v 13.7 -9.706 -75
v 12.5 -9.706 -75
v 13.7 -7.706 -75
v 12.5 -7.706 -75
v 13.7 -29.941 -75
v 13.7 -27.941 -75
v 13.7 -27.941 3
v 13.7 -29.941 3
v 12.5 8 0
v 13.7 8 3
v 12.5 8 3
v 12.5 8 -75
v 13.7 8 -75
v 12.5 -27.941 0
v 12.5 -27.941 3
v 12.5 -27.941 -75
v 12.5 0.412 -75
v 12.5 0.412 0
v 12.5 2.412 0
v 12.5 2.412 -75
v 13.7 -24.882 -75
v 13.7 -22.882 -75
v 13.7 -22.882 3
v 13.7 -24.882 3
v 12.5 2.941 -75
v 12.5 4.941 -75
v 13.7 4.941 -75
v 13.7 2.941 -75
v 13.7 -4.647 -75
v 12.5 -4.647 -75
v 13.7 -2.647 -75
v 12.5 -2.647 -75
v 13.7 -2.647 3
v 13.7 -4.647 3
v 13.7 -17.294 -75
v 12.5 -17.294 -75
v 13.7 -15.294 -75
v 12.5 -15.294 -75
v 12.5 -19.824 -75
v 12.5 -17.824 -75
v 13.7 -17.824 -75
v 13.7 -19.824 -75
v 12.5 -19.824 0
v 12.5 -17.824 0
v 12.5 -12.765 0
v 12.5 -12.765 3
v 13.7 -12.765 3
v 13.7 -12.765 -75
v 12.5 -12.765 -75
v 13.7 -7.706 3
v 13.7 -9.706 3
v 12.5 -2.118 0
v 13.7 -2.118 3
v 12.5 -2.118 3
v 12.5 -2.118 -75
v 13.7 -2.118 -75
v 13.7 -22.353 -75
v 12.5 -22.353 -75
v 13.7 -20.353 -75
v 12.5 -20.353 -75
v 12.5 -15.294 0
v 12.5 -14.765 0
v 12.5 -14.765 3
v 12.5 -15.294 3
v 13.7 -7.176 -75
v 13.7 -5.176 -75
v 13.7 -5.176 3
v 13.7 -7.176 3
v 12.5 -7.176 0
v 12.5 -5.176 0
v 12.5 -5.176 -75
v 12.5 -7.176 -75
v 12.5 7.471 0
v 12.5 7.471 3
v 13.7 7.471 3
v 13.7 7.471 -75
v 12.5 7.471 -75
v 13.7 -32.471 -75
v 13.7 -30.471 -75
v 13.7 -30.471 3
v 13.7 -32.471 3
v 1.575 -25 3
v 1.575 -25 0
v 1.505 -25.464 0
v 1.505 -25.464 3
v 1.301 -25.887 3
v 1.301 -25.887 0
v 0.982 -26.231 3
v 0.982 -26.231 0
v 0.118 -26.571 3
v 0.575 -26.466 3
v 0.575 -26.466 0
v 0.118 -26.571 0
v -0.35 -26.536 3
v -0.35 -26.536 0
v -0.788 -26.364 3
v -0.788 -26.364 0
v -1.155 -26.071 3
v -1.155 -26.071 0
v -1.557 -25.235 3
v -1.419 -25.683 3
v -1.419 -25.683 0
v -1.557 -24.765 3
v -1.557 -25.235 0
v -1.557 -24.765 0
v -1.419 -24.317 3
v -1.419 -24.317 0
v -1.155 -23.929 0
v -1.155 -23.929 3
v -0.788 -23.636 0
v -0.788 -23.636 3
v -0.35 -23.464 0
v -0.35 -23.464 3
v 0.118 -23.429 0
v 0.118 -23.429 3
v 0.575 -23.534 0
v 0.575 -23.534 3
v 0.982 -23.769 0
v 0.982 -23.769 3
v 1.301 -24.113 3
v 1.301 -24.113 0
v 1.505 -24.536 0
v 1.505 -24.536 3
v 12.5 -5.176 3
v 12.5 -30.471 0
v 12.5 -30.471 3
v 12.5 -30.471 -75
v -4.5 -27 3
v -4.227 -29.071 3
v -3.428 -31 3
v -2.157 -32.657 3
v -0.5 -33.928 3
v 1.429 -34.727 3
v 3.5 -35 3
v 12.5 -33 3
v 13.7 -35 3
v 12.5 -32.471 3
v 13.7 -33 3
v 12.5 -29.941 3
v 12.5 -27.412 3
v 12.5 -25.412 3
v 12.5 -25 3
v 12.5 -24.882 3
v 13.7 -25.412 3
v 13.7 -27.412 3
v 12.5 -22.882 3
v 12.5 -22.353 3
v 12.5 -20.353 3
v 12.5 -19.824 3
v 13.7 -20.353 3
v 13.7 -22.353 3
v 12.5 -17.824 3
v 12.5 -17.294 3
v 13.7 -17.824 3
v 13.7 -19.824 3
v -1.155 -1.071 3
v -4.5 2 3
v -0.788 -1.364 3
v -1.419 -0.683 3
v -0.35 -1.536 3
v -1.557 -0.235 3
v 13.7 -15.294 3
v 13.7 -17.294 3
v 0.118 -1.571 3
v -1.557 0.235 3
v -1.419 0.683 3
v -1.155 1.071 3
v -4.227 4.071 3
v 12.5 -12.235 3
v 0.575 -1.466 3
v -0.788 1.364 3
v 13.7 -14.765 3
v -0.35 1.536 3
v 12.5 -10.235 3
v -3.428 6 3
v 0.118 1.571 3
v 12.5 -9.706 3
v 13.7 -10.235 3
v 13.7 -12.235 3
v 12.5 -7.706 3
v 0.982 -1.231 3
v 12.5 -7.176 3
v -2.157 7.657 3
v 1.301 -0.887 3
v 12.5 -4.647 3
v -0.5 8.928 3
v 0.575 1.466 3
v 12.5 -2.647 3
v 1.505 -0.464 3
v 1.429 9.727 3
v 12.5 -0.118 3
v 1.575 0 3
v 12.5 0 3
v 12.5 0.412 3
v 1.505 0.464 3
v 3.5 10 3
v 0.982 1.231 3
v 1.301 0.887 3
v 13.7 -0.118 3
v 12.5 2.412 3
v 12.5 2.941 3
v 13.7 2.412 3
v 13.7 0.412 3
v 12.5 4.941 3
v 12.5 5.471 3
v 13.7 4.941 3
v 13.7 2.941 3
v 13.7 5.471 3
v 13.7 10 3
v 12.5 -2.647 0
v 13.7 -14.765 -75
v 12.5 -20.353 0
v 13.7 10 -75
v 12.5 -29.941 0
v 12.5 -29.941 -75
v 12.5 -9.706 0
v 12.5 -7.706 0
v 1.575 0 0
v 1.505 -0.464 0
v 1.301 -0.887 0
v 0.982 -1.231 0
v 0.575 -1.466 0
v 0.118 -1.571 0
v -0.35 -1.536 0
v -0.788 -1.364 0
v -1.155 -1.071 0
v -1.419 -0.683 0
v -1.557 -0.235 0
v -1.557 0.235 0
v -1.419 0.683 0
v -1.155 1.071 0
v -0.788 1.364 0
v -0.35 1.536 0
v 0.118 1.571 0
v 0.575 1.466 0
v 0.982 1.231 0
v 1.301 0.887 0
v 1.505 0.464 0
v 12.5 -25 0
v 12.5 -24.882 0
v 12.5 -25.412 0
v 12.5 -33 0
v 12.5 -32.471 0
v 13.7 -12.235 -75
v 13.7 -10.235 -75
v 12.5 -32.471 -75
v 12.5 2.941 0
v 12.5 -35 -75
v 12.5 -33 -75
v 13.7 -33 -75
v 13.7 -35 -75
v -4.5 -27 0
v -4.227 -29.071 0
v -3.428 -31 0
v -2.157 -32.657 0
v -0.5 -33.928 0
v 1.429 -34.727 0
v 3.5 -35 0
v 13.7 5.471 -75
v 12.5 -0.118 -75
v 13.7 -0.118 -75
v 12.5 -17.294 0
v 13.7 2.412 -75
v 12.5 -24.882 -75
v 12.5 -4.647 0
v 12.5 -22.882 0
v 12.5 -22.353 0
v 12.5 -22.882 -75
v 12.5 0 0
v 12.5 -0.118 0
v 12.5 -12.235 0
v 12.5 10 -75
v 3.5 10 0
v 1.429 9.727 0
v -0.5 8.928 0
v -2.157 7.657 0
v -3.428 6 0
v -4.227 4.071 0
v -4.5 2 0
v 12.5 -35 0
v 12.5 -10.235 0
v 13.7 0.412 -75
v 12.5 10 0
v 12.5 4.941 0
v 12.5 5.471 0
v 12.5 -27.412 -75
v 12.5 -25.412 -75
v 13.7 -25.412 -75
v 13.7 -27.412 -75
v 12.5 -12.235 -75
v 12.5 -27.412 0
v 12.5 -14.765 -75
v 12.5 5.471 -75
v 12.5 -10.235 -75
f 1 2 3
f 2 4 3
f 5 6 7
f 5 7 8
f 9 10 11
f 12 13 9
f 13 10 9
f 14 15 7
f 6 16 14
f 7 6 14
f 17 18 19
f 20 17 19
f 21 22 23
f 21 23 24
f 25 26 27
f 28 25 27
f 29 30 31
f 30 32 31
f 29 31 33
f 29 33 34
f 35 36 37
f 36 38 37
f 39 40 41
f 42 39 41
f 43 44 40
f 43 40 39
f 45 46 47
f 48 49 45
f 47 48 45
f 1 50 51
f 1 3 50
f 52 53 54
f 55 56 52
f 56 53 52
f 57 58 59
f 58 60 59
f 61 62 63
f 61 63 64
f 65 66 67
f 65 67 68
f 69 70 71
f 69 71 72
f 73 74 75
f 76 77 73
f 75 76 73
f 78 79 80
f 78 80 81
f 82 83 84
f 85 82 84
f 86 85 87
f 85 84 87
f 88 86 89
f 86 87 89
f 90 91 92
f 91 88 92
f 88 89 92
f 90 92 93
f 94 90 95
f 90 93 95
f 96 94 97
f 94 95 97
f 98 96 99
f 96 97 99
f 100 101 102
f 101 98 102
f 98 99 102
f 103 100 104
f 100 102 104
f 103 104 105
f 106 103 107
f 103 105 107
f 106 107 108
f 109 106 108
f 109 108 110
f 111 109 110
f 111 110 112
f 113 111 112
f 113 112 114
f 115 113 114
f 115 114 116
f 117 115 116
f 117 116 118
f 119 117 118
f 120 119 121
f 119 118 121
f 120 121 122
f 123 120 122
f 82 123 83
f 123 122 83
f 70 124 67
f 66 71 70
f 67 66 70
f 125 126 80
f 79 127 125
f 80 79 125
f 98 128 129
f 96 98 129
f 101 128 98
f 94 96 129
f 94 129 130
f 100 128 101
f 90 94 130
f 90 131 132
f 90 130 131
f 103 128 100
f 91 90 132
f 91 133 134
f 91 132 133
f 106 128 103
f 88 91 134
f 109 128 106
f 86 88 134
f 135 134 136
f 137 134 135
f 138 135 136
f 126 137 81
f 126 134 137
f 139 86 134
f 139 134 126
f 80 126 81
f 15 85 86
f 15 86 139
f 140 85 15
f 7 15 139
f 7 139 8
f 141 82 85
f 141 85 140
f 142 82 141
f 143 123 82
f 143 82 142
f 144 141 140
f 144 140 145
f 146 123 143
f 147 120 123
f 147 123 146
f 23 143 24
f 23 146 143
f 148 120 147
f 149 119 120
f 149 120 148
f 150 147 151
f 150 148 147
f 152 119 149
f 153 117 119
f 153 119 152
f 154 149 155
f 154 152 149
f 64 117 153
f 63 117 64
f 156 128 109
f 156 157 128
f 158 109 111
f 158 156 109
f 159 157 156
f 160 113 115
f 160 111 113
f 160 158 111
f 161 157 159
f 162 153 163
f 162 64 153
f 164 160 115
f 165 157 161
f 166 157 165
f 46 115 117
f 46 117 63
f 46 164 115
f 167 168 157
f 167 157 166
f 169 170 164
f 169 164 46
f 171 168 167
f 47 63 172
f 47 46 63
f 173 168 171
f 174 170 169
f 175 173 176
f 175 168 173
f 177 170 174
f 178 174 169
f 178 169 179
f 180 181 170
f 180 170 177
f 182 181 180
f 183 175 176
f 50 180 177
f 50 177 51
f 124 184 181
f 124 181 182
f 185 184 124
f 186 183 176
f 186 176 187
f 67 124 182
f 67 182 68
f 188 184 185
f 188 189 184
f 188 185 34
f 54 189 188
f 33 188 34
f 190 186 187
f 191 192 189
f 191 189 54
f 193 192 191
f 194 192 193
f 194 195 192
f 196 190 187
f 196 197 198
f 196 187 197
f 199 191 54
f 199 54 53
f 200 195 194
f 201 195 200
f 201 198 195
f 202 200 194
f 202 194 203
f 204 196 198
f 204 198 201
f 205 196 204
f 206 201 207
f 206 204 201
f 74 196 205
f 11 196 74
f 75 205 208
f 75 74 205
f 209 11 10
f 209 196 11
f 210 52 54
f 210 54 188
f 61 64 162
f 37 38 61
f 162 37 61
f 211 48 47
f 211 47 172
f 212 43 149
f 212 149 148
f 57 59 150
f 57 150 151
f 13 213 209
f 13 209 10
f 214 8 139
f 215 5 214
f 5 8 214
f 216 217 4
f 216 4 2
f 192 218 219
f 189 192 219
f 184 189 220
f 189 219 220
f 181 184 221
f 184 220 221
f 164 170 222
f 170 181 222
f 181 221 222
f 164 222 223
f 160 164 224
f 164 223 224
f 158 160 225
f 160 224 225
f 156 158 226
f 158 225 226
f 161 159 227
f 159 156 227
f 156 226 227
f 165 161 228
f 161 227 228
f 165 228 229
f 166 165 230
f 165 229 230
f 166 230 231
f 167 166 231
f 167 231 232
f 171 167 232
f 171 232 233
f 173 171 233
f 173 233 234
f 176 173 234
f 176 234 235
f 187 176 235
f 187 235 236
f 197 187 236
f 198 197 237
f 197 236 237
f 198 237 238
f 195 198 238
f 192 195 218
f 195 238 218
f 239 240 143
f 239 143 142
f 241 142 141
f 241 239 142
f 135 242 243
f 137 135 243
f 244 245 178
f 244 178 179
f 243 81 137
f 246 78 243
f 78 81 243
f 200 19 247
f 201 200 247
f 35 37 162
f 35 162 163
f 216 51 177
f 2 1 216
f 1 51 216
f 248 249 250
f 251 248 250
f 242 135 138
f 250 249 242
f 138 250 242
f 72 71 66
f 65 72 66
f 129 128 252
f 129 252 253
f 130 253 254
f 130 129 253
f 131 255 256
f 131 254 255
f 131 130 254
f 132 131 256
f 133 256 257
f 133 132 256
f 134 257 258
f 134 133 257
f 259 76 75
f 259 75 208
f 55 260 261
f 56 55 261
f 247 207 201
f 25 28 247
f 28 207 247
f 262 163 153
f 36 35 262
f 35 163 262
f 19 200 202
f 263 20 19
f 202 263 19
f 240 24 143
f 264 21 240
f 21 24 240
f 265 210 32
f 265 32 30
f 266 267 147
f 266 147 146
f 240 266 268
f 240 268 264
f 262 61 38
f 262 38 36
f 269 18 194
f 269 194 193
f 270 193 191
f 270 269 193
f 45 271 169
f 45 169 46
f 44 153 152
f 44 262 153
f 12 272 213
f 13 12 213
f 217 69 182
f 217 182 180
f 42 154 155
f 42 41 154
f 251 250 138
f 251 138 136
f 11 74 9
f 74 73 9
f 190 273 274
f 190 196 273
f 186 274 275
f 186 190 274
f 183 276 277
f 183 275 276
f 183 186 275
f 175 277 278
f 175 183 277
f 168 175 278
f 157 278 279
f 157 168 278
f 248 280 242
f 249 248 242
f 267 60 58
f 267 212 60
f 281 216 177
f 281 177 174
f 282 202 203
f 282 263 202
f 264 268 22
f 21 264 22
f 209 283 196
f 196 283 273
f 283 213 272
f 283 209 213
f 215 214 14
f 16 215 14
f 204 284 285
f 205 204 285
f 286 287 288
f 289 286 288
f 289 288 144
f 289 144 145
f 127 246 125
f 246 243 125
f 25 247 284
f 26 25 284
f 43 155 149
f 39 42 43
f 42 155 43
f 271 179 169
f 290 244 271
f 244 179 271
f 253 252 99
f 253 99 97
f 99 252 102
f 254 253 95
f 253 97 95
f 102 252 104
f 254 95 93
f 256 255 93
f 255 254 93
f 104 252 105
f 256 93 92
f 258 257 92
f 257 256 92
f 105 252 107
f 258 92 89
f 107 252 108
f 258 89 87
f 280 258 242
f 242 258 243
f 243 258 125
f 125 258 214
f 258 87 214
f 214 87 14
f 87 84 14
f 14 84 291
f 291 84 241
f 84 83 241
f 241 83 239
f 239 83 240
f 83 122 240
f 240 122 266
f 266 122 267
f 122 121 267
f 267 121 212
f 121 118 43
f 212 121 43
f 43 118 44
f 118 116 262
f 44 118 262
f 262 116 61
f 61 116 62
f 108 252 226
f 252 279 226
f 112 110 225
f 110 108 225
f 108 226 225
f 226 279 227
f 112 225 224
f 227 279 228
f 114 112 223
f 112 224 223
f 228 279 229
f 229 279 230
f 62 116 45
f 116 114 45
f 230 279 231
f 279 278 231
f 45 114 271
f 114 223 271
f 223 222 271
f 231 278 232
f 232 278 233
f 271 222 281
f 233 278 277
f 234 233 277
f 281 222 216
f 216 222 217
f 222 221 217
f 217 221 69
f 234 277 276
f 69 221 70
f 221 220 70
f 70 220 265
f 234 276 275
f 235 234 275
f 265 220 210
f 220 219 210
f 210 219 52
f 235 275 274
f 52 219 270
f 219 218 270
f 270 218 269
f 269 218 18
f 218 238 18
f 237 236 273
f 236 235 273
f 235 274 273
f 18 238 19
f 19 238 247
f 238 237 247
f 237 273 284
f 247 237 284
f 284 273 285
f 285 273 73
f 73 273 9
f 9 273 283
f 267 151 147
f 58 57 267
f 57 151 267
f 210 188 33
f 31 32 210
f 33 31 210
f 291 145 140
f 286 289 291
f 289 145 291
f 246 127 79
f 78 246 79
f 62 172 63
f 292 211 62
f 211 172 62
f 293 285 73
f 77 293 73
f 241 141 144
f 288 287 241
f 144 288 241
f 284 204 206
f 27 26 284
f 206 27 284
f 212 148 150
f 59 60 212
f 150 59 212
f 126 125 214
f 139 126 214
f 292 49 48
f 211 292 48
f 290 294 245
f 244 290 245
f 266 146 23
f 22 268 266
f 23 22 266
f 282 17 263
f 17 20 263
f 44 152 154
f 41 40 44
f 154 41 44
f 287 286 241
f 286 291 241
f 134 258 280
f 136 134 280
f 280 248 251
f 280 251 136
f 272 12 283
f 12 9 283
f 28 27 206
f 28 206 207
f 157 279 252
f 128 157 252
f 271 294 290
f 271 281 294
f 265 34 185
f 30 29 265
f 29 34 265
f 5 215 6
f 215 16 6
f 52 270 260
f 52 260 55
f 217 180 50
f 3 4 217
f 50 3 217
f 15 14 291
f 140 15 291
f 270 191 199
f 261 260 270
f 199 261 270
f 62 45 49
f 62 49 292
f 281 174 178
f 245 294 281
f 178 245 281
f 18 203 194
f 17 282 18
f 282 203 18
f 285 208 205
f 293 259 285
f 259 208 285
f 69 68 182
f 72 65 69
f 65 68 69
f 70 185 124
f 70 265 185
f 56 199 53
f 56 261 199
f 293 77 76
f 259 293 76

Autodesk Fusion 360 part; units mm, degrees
sketch "Boceto1" plane through (0, 0, 0) normal (0, 0, 1) x (1, 0, 0)
  circle A0 centre (0, 0) radius 1.575
  line L0 (0, 0) -> (12.5, 0)
  line L1 (12.5, 0) -> (12.5, 10)
  line L2 (12.5, 0) -> (12.5, -25)
  line L3 (12.5, 10) -> (-4.5, 10)
  line L4 (-4.5, 10) -> (-4.5, -35)
  line L5 (-4.5, -35) -> (12.5, -35)
  line L6 (12.5, -35) -> (12.5, 10)
  line L7 (12.5, -25) -> (0, -25)
  circle A1 centre (0, -25) radius 1.575
  line L8 (12.5, 10) -> (13.7, 10)
  line L9 (13.7, 10) -> (13.7, 8)
  line L10 (13.7, 8) -> (12.5, 8)
  line L11 (12.5, 8) -> (12.5, 10)
  line L12 (13.7, 5.4706) -> (12.5, 5.4706)
  line L13 (13.7, 7.4706) -> (13.7, 5.4706)
  line L14 (12.5, 7.4706) -> (13.7, 7.4706)
  line L15 (12.5, 5.4706) -> (12.5, 7.4706)
  line L16 (13.7, 2.9412) -> (12.5, 2.9412)
  line L17 (13.7, 4.9412) -> (13.7, 2.9412)
  line L18 (12.5, 4.9412) -> (13.7, 4.9412)
  line L19 (12.5, 2.9412) -> (12.5, 4.9412)
  line L20 (13.7, 0.4118) -> (12.5, 0.4118)
  line L21 (13.7, 2.4118) -> (13.7, 0.4118)
  line L22 (12.5, 2.4118) -> (13.7, 2.4118)
  line L23 (12.5, 0.4118) -> (12.5, 2.4118)
  line L24 (13.7, -2.1176) -> (12.5, -2.1176)
  line L25 (13.7, -0.1176) -> (13.7, -2.1176)
  line L26 (12.5, -0.1176) -> (13.7, -0.1176)
  line L27 (12.5, -2.1176) -> (12.5, -0.1176)
  line L28 (13.7, -4.6471) -> (12.5, -4.6471)
  line L29 (13.7, -2.6471) -> (13.7, -4.6471)
  line L30 (12.5, -2.6471) -> (13.7, -2.6471)
  line L31 (12.5, -4.6471) -> (12.5, -2.6471)
  line L32 (13.7, -7.1765) -> (12.5, -7.1765)
  line L33 (13.7, -5.1765) -> (13.7, -7.1765)
  line L34 (12.5, -5.1765) -> (13.7, -5.1765)
  line L35 (12.5, -7.1765) -> (12.5, -5.1765)
  line L36 (13.7, -9.7059) -> (12.5, -9.7059)
  line L37 (13.7, -7.7059) -> (13.7, -9.7059)
  line L38 (12.5, -7.7059) -> (13.7, -7.7059)
  line L39 (12.5, -9.7059) -> (12.5, -7.7059)
  line L40 (13.7, -12.2353) -> (12.5, -12.2353)
  line L41 (13.7, -10.2353) -> (13.7, -12.2353)
  line L42 (12.5, -10.2353) -> (13.7, -10.2353)
  line L43 (12.5, -12.2353) -> (12.5, -10.2353)
  line L44 (13.7, -14.7647) -> (12.5, -14.7647)
  line L45 (13.7, -12.7647) -> (13.7, -14.7647)
  line L46 (12.5, -12.7647) -> (13.7, -12.7647)
  line L47 (12.5, -14.7647) -> (12.5, -12.7647)
  line L48 (13.7, -17.2941) -> (12.5, -17.2941)
  line L49 (13.7, -15.2941) -> (13.7, -17.2941)
  line L50 (12.5, -15.2941) -> (13.7, -15.2941)
  line L51 (12.5, -17.2941) -> (12.5, -15.2941)
  line L52 (13.7, -19.8235) -> (12.5, -19.8235)
  line L53 (13.7, -17.8235) -> (13.7, -19.8235)
  line L54 (12.5, -17.8235) -> (13.7, -17.8235)
  line L55 (12.5, -19.8235) -> (12.5, -17.8235)
  line L56 (13.7, -22.3529) -> (12.5, -22.3529)
  line L57 (13.7, -20.3529) -> (13.7, -22.3529)
  line L58 (12.5, -20.3529) -> (13.7, -20.3529)
  line L59 (12.5, -22.3529) -> (12.5, -20.3529)
  line L60 (13.7, -24.8824) -> (12.5, -24.8824)
  line L61 (13.7, -22.8824) -> (13.7, -24.8824)
  line L62 (12.5, -22.8824) -> (13.7, -22.8824)
  line L63 (12.5, -24.8824) -> (12.5, -22.8824)
  line L64 (13.7, -27.4118) -> (12.5, -27.4118)
  line L65 (13.7, -25.4118) -> (13.7, -27.4118)
  line L66 (12.5, -25.4118) -> (13.7, -25.4118)
  line L67 (12.5, -27.4118) -> (12.5, -25.4118)
  line L68 (13.7, -29.9412) -> (12.5, -29.9412)
  line L69 (13.7, -27.9412) -> (13.7, -29.9412)
  line L70 (12.5, -27.9412) -> (13.7, -27.9412)
  line L71 (12.5, -29.9412) -> (12.5, -27.9412)
  line L72 (13.7, -32.4706) -> (12.5, -32.4706)
  line L73 (13.7, -30.4706) -> (13.7, -32.4706)
  line L74 (12.5, -30.4706) -> (13.7, -30.4706)
  line L75 (12.5, -32.4706) -> (12.5, -30.4706)
  line L76 (13.7, -35) -> (12.5, -35)
  line L77 (13.7, -33) -> (13.7, -35)
  line L78 (12.5, -33) -> (13.7, -33)
  line L79 (12.5, -35) -> (12.5, -33)
  dimension "d1" = 3.15
  dimension "d2" = 12.5
  dimension "d3" = 10
  dimension "d4" = 25
  dimension "d5" = 17
  dimension "d6" = 45
  dimension "d7" = 12.5
  dimension "d8" = 3.15
  dimension "d9" = 1.2
  dimension "d10" = 2
  dimension "d13" = 0
  dimension "d14" = -43
extrude "Extruir1" add sketch "Boceto1" along normal blind 3 makes body 1
copy_body "Cuerpo - > Comp.1" bodies 1 removing the originals makes body 2 in component "Cortina de Lamas"
extrude "Extruir1'" add sketch "Boceto1" against normal blind 75 contours L1 L6 L20 L21 L22 L23 | L2 L6 L24 L25 L26 L27 | L1 L6 L16 L17 L18 L19 | L2 L6 L28 L29 L30 L31 | L1 L6 L12 L13 L14 L15 | L2 L6 L32 L33 L34 L35 | L1 L6 L8 L9 L10 L11 | L2 L6 L36 L37 L38 L39 | L2 L6 L40 L41 L42 L43 | L6 L76 L77 L78 L79 | L2 L6 L44 L45 L46 L47 | L6 L72 L73 L74 L75 | L2 L6 L48 L49 L50 L51 | L6 L68 L69 L70 L71 | L2 L6 L52 L53 L54 L55 | L6 L64 L65 L66 L67 | L2 L6 L56 L57 L58 L59 | L2 L6 L60 L61 L62 L63 bodies 2 in component "Cortina de Lamas"
fillet "Empalme1" radius 8 2 edges at (-4.5, 10, 1.5) (-4.5, -35, 1.5) on bodies 2 in component "Cortina de Lamas"
component "Cortina de Lamas" placed x (1, 0, 0) y (0, 1, 0) z (0, 0, 1) at (0, 0, 0)
